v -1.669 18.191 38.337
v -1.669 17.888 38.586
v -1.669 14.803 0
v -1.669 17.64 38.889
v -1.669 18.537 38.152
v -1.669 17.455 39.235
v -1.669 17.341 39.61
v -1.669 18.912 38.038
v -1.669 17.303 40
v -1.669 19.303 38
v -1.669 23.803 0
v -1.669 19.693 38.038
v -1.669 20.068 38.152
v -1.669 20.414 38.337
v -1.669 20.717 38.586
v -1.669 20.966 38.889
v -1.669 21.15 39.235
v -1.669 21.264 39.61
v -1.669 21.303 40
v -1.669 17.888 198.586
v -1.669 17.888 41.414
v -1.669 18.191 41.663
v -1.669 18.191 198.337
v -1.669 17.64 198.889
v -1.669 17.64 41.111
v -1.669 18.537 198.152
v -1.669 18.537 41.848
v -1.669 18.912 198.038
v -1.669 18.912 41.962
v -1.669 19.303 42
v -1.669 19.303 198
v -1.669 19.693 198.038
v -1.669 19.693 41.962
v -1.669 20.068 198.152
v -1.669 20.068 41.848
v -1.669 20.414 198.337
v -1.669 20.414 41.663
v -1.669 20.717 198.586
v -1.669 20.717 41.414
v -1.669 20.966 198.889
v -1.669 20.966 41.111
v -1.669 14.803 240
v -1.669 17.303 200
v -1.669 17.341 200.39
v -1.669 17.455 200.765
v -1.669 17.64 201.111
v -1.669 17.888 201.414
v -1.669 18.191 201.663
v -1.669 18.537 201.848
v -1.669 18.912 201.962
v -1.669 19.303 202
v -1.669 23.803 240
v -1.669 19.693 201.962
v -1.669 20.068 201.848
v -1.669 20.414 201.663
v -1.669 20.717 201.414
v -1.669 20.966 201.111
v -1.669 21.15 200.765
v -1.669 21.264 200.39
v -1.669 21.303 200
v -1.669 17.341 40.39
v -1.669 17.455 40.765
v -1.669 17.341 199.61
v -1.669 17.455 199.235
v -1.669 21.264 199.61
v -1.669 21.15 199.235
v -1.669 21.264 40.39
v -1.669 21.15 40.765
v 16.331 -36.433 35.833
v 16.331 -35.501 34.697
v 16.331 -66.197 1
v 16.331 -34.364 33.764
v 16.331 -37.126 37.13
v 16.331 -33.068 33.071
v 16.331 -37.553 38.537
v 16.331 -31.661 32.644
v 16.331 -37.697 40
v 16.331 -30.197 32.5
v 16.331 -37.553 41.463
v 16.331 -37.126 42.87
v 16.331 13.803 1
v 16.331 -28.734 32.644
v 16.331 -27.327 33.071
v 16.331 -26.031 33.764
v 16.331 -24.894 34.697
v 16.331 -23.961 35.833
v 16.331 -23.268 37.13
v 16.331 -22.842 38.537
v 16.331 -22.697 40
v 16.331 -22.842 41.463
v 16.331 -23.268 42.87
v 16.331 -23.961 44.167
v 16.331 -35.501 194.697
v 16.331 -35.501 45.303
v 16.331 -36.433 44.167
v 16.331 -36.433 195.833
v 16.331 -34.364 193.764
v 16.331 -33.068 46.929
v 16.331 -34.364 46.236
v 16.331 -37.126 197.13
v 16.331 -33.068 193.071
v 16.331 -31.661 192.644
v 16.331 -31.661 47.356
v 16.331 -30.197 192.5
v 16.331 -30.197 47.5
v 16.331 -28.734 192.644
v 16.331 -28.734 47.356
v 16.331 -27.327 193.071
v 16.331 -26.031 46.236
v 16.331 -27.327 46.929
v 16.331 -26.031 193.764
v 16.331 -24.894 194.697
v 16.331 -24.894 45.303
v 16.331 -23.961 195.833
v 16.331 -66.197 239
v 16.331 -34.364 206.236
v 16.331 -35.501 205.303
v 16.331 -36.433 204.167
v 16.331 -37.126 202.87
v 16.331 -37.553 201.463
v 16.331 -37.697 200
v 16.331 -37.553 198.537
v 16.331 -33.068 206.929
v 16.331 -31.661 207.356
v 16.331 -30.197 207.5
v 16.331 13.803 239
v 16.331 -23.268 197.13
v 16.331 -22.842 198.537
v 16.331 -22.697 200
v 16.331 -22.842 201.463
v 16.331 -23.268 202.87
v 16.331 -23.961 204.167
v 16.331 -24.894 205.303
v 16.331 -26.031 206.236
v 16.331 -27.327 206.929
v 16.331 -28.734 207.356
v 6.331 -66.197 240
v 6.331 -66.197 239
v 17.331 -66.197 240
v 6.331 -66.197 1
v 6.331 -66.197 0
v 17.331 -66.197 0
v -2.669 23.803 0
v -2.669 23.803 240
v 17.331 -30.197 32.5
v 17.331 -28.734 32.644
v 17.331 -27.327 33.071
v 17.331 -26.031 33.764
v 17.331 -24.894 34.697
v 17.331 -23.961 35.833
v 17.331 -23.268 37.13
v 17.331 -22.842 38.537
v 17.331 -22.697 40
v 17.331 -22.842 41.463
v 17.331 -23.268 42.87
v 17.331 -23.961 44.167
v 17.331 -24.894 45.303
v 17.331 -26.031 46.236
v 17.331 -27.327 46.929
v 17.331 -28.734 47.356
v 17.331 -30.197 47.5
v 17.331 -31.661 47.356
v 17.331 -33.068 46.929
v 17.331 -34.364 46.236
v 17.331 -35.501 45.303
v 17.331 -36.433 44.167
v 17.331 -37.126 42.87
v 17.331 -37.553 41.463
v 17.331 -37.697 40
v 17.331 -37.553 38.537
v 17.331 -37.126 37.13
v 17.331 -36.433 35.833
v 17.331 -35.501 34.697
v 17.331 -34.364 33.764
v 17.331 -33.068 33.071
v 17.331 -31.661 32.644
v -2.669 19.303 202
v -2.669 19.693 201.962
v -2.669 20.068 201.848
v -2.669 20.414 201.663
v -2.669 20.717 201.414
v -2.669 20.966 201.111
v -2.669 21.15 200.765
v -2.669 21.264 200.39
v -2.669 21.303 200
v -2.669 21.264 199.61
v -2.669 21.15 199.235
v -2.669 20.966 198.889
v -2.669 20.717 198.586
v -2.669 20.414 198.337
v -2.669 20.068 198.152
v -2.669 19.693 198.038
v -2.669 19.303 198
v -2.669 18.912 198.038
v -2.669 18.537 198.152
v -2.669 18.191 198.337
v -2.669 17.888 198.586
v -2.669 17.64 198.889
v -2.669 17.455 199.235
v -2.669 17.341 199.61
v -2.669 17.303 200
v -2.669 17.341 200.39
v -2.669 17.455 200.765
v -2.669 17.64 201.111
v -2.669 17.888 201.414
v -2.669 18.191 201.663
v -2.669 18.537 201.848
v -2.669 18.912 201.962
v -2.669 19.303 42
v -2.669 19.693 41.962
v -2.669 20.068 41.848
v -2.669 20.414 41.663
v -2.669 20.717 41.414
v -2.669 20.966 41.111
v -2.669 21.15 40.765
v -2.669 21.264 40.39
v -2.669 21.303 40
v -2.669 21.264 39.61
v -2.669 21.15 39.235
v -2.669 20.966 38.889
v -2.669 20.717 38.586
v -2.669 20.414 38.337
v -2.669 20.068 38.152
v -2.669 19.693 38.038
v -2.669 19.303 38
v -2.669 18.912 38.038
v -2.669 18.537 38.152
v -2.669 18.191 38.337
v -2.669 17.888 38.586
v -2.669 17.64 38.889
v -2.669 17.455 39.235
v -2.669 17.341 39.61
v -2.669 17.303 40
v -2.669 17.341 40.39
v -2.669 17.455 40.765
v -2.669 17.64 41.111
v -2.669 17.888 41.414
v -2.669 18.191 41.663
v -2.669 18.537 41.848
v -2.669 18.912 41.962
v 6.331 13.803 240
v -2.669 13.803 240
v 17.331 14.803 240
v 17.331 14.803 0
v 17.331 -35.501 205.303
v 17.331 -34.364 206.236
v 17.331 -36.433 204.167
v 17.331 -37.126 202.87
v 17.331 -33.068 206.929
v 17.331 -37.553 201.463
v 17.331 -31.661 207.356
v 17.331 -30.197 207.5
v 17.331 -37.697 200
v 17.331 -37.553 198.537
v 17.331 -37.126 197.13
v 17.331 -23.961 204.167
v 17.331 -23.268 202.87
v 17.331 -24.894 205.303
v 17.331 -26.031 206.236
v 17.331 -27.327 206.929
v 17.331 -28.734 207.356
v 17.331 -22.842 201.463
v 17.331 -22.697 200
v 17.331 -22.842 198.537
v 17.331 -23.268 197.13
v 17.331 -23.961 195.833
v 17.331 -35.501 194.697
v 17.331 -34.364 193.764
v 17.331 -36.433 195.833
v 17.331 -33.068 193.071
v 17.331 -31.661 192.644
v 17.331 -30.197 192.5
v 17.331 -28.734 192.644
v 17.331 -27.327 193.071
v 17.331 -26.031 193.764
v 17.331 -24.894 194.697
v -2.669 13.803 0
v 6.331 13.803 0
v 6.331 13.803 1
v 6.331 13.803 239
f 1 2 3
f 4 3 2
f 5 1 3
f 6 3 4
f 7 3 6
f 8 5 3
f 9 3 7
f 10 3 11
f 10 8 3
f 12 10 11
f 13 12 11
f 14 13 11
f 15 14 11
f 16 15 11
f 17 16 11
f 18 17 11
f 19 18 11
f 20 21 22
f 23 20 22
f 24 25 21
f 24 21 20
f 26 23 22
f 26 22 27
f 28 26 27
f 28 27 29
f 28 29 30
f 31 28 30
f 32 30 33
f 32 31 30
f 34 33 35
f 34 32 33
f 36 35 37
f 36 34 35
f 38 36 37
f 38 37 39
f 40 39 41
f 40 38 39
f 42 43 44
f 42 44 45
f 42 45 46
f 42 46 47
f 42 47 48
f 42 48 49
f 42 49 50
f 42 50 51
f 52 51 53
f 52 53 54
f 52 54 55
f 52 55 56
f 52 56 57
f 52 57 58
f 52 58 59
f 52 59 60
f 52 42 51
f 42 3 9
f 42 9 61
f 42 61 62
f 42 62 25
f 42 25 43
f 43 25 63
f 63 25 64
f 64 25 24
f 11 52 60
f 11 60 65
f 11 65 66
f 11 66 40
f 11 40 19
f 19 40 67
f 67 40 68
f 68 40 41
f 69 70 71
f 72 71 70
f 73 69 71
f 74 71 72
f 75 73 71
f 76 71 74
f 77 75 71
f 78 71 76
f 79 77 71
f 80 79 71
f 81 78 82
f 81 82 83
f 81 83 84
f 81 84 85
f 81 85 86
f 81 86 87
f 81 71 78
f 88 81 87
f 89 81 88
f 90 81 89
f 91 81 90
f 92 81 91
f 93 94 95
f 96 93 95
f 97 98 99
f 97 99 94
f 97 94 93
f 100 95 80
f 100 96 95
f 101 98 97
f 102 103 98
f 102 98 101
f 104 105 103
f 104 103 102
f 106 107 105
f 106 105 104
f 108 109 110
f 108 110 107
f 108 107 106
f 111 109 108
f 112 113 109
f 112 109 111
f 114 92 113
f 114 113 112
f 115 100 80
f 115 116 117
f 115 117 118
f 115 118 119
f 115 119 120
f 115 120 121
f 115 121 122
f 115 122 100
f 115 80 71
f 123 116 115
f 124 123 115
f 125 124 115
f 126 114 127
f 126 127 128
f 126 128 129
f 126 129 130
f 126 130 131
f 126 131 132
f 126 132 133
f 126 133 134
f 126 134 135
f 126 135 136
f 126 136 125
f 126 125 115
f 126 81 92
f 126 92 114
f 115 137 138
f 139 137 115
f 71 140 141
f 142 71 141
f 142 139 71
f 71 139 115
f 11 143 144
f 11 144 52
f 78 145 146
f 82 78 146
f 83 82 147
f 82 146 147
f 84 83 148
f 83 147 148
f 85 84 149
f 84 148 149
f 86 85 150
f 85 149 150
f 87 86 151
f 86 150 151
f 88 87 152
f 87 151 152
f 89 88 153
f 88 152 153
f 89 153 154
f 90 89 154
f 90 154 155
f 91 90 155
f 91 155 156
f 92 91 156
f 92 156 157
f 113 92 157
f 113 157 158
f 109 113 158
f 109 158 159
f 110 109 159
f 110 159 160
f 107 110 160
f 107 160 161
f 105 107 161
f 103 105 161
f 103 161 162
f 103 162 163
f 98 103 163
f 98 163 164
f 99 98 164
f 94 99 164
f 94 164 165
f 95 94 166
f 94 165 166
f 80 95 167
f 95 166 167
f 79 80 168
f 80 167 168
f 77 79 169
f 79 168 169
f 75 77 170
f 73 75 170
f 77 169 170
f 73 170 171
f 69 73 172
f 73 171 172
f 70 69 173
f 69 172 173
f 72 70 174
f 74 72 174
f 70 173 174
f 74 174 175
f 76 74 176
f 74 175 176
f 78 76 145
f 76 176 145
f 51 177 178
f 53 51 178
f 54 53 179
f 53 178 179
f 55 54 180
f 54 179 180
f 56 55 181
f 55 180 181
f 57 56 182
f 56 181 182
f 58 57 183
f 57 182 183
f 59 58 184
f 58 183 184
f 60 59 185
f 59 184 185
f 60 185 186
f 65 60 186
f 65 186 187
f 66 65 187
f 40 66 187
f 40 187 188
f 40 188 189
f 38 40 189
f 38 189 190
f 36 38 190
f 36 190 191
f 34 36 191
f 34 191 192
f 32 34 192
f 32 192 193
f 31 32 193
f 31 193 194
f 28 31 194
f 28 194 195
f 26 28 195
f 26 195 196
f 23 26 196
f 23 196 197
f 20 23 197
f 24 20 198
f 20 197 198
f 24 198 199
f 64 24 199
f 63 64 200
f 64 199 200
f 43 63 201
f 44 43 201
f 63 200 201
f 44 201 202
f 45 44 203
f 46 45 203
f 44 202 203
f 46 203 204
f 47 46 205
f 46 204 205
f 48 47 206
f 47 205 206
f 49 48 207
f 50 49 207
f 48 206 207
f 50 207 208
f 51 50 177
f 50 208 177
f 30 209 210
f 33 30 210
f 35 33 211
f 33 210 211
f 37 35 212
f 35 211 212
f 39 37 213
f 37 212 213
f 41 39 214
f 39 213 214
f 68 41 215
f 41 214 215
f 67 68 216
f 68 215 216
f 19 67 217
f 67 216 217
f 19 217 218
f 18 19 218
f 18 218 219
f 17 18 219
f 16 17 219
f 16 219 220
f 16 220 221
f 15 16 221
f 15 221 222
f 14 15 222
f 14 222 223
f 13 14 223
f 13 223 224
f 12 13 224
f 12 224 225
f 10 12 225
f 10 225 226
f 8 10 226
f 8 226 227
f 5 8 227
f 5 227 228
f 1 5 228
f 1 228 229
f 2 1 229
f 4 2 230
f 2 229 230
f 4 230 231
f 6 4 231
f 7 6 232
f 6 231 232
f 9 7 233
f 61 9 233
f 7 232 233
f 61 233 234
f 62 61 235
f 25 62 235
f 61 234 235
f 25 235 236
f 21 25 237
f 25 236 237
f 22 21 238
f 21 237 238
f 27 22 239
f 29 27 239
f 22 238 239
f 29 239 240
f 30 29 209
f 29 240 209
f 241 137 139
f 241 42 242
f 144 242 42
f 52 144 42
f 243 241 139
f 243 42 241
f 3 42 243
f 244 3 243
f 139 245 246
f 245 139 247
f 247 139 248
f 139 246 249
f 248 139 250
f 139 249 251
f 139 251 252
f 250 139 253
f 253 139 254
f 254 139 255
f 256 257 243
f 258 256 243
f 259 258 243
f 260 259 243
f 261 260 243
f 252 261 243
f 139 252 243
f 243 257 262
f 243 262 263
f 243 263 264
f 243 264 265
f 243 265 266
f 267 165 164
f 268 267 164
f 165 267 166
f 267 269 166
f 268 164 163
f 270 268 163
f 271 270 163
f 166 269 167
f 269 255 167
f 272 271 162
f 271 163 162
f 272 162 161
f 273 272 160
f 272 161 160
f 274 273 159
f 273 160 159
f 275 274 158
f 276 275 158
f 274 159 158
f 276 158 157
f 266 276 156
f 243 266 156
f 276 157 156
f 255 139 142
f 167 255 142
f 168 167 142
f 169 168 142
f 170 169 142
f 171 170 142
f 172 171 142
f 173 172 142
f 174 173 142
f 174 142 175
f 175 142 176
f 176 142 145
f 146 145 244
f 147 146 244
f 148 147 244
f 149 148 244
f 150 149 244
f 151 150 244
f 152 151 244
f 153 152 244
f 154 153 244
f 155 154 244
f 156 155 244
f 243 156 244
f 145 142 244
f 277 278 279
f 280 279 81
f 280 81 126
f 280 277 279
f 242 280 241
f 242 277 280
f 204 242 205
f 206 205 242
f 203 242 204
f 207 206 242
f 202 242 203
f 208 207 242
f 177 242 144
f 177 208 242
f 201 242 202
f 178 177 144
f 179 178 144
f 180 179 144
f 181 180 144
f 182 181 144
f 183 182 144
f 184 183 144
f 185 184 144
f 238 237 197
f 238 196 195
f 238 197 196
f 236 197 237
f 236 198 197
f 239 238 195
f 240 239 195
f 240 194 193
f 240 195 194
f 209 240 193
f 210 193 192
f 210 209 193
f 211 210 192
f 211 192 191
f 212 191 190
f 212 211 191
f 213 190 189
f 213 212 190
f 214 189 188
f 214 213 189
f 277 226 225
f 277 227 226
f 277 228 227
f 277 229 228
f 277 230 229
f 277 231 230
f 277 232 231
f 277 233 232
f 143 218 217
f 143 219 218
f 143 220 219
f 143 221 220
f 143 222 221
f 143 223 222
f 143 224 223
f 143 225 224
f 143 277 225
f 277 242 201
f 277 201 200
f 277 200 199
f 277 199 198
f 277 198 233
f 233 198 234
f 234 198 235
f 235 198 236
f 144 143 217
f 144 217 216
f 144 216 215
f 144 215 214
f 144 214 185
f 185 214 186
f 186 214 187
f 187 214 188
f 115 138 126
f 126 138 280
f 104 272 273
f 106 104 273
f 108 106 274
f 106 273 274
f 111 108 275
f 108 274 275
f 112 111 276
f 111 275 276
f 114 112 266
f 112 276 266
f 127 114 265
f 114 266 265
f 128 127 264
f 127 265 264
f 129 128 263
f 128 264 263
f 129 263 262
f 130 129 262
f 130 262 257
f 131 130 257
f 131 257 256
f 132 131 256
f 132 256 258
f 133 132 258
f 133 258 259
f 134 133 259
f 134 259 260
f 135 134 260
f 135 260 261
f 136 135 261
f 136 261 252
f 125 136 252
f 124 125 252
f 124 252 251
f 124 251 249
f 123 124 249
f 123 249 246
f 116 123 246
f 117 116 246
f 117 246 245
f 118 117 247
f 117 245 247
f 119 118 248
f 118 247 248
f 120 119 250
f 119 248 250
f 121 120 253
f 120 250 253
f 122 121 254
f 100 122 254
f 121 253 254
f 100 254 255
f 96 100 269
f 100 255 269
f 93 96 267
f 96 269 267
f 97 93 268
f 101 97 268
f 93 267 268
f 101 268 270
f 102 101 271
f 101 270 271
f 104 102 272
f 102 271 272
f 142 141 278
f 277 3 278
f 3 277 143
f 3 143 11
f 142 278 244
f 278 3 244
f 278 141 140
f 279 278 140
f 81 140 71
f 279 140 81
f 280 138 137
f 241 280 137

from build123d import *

# Parameters (mm, degrees)
CROQUIS1_W              = 20
CROQUIS1_H              = 100
SALIENTE_EXTRUIR1_DEPTH = 240
CROQUIS2_W              = 19
CROQUIS2_H              = 9
CORTAR_EXTRUIR1_DEPTH   = 240
CROQUIS3_R              = 2
CROQUIS3_W              = 238
CROQUIS3_H              = 90
CORTAR_EXTRUIR2_DEPTH   = 19
CROQUIS4_W              = 1
CROQUIS4_H              = 90
CORTAR_EXTRUIR3_DEPTH   = 9
CROQUIS5_R              = 7.5
CROQUIS5_W              = 240
CROQUIS5_H              = 10
CORTAR_EXTRUIR5_DEPTH   = 20


with BuildPart() as part:
    # Croquis1 → Saliente-Extruir1 (new body)
    with BuildSketch(Plane.XY):
        with Locations((7.330646947, -26.197398527)):
            Rectangle(CROQUIS1_W, CROQUIS1_H)
    extrude(amount=SALIENTE_EXTRUIR1_DEPTH)

    # Croquis2 → Cortar-Extruir1 (cut)
    with BuildSketch(Plane.XY.offset(240)):
        with Locations((7.830646947, 19.302601473)):
            Rectangle(CROQUIS2_W, CROQUIS2_H)
    extrude(amount=-CORTAR_EXTRUIR1_DEPTH, mode=Mode.SUBTRACT)

    # Croquis3 → Cortar-Extruir2 (cut)
    with BuildSketch(Plane.ZY.offset(2.669353053)):
        with Locations((40, 19.302601473)):
            Circle(CROQUIS3_R)
        with Locations((200, 19.302601473)):
            Circle(CROQUIS3_R)
        with Locations((120, -31.197398527)):
            Rectangle(CROQUIS3_W, CROQUIS3_H)
    extrude(amount=-CORTAR_EXTRUIR2_DEPTH, mode=Mode.SUBTRACT)

    # Croquis4 → Cortar-Extruir3 (cut)
    with BuildSketch(Plane.ZY.offset(2.669353053)):
        with Locations((0.5, -31.197398527)):
            Rectangle(CROQUIS4_W, CROQUIS4_H)
        with Locations((239.5, -31.197398527)):
            Rectangle(CROQUIS4_W, CROQUIS4_H)
    extrude(amount=-CORTAR_EXTRUIR3_DEPTH, mode=Mode.SUBTRACT)

    # Croquis5 → Cortar-Extruir5 (cut)
    with BuildSketch(Plane(origin=(17.330646947, 0, 0), x_dir=(0, 0, -1), z_dir=(1, 0, 0))):
        with Locations((-200, -30.197398527)):
            Circle(CROQUIS5_R)
        with Locations((-40, -30.197398527)):
            Circle(CROQUIS5_R)
        with Locations((-120, -71.197398527)):
            Rectangle(CROQUIS5_W, CROQUIS5_H)
    extrude(amount=-CORTAR_EXTRUIR5_DEPTH, mode=Mode.SUBTRACT)


solid = part.part
